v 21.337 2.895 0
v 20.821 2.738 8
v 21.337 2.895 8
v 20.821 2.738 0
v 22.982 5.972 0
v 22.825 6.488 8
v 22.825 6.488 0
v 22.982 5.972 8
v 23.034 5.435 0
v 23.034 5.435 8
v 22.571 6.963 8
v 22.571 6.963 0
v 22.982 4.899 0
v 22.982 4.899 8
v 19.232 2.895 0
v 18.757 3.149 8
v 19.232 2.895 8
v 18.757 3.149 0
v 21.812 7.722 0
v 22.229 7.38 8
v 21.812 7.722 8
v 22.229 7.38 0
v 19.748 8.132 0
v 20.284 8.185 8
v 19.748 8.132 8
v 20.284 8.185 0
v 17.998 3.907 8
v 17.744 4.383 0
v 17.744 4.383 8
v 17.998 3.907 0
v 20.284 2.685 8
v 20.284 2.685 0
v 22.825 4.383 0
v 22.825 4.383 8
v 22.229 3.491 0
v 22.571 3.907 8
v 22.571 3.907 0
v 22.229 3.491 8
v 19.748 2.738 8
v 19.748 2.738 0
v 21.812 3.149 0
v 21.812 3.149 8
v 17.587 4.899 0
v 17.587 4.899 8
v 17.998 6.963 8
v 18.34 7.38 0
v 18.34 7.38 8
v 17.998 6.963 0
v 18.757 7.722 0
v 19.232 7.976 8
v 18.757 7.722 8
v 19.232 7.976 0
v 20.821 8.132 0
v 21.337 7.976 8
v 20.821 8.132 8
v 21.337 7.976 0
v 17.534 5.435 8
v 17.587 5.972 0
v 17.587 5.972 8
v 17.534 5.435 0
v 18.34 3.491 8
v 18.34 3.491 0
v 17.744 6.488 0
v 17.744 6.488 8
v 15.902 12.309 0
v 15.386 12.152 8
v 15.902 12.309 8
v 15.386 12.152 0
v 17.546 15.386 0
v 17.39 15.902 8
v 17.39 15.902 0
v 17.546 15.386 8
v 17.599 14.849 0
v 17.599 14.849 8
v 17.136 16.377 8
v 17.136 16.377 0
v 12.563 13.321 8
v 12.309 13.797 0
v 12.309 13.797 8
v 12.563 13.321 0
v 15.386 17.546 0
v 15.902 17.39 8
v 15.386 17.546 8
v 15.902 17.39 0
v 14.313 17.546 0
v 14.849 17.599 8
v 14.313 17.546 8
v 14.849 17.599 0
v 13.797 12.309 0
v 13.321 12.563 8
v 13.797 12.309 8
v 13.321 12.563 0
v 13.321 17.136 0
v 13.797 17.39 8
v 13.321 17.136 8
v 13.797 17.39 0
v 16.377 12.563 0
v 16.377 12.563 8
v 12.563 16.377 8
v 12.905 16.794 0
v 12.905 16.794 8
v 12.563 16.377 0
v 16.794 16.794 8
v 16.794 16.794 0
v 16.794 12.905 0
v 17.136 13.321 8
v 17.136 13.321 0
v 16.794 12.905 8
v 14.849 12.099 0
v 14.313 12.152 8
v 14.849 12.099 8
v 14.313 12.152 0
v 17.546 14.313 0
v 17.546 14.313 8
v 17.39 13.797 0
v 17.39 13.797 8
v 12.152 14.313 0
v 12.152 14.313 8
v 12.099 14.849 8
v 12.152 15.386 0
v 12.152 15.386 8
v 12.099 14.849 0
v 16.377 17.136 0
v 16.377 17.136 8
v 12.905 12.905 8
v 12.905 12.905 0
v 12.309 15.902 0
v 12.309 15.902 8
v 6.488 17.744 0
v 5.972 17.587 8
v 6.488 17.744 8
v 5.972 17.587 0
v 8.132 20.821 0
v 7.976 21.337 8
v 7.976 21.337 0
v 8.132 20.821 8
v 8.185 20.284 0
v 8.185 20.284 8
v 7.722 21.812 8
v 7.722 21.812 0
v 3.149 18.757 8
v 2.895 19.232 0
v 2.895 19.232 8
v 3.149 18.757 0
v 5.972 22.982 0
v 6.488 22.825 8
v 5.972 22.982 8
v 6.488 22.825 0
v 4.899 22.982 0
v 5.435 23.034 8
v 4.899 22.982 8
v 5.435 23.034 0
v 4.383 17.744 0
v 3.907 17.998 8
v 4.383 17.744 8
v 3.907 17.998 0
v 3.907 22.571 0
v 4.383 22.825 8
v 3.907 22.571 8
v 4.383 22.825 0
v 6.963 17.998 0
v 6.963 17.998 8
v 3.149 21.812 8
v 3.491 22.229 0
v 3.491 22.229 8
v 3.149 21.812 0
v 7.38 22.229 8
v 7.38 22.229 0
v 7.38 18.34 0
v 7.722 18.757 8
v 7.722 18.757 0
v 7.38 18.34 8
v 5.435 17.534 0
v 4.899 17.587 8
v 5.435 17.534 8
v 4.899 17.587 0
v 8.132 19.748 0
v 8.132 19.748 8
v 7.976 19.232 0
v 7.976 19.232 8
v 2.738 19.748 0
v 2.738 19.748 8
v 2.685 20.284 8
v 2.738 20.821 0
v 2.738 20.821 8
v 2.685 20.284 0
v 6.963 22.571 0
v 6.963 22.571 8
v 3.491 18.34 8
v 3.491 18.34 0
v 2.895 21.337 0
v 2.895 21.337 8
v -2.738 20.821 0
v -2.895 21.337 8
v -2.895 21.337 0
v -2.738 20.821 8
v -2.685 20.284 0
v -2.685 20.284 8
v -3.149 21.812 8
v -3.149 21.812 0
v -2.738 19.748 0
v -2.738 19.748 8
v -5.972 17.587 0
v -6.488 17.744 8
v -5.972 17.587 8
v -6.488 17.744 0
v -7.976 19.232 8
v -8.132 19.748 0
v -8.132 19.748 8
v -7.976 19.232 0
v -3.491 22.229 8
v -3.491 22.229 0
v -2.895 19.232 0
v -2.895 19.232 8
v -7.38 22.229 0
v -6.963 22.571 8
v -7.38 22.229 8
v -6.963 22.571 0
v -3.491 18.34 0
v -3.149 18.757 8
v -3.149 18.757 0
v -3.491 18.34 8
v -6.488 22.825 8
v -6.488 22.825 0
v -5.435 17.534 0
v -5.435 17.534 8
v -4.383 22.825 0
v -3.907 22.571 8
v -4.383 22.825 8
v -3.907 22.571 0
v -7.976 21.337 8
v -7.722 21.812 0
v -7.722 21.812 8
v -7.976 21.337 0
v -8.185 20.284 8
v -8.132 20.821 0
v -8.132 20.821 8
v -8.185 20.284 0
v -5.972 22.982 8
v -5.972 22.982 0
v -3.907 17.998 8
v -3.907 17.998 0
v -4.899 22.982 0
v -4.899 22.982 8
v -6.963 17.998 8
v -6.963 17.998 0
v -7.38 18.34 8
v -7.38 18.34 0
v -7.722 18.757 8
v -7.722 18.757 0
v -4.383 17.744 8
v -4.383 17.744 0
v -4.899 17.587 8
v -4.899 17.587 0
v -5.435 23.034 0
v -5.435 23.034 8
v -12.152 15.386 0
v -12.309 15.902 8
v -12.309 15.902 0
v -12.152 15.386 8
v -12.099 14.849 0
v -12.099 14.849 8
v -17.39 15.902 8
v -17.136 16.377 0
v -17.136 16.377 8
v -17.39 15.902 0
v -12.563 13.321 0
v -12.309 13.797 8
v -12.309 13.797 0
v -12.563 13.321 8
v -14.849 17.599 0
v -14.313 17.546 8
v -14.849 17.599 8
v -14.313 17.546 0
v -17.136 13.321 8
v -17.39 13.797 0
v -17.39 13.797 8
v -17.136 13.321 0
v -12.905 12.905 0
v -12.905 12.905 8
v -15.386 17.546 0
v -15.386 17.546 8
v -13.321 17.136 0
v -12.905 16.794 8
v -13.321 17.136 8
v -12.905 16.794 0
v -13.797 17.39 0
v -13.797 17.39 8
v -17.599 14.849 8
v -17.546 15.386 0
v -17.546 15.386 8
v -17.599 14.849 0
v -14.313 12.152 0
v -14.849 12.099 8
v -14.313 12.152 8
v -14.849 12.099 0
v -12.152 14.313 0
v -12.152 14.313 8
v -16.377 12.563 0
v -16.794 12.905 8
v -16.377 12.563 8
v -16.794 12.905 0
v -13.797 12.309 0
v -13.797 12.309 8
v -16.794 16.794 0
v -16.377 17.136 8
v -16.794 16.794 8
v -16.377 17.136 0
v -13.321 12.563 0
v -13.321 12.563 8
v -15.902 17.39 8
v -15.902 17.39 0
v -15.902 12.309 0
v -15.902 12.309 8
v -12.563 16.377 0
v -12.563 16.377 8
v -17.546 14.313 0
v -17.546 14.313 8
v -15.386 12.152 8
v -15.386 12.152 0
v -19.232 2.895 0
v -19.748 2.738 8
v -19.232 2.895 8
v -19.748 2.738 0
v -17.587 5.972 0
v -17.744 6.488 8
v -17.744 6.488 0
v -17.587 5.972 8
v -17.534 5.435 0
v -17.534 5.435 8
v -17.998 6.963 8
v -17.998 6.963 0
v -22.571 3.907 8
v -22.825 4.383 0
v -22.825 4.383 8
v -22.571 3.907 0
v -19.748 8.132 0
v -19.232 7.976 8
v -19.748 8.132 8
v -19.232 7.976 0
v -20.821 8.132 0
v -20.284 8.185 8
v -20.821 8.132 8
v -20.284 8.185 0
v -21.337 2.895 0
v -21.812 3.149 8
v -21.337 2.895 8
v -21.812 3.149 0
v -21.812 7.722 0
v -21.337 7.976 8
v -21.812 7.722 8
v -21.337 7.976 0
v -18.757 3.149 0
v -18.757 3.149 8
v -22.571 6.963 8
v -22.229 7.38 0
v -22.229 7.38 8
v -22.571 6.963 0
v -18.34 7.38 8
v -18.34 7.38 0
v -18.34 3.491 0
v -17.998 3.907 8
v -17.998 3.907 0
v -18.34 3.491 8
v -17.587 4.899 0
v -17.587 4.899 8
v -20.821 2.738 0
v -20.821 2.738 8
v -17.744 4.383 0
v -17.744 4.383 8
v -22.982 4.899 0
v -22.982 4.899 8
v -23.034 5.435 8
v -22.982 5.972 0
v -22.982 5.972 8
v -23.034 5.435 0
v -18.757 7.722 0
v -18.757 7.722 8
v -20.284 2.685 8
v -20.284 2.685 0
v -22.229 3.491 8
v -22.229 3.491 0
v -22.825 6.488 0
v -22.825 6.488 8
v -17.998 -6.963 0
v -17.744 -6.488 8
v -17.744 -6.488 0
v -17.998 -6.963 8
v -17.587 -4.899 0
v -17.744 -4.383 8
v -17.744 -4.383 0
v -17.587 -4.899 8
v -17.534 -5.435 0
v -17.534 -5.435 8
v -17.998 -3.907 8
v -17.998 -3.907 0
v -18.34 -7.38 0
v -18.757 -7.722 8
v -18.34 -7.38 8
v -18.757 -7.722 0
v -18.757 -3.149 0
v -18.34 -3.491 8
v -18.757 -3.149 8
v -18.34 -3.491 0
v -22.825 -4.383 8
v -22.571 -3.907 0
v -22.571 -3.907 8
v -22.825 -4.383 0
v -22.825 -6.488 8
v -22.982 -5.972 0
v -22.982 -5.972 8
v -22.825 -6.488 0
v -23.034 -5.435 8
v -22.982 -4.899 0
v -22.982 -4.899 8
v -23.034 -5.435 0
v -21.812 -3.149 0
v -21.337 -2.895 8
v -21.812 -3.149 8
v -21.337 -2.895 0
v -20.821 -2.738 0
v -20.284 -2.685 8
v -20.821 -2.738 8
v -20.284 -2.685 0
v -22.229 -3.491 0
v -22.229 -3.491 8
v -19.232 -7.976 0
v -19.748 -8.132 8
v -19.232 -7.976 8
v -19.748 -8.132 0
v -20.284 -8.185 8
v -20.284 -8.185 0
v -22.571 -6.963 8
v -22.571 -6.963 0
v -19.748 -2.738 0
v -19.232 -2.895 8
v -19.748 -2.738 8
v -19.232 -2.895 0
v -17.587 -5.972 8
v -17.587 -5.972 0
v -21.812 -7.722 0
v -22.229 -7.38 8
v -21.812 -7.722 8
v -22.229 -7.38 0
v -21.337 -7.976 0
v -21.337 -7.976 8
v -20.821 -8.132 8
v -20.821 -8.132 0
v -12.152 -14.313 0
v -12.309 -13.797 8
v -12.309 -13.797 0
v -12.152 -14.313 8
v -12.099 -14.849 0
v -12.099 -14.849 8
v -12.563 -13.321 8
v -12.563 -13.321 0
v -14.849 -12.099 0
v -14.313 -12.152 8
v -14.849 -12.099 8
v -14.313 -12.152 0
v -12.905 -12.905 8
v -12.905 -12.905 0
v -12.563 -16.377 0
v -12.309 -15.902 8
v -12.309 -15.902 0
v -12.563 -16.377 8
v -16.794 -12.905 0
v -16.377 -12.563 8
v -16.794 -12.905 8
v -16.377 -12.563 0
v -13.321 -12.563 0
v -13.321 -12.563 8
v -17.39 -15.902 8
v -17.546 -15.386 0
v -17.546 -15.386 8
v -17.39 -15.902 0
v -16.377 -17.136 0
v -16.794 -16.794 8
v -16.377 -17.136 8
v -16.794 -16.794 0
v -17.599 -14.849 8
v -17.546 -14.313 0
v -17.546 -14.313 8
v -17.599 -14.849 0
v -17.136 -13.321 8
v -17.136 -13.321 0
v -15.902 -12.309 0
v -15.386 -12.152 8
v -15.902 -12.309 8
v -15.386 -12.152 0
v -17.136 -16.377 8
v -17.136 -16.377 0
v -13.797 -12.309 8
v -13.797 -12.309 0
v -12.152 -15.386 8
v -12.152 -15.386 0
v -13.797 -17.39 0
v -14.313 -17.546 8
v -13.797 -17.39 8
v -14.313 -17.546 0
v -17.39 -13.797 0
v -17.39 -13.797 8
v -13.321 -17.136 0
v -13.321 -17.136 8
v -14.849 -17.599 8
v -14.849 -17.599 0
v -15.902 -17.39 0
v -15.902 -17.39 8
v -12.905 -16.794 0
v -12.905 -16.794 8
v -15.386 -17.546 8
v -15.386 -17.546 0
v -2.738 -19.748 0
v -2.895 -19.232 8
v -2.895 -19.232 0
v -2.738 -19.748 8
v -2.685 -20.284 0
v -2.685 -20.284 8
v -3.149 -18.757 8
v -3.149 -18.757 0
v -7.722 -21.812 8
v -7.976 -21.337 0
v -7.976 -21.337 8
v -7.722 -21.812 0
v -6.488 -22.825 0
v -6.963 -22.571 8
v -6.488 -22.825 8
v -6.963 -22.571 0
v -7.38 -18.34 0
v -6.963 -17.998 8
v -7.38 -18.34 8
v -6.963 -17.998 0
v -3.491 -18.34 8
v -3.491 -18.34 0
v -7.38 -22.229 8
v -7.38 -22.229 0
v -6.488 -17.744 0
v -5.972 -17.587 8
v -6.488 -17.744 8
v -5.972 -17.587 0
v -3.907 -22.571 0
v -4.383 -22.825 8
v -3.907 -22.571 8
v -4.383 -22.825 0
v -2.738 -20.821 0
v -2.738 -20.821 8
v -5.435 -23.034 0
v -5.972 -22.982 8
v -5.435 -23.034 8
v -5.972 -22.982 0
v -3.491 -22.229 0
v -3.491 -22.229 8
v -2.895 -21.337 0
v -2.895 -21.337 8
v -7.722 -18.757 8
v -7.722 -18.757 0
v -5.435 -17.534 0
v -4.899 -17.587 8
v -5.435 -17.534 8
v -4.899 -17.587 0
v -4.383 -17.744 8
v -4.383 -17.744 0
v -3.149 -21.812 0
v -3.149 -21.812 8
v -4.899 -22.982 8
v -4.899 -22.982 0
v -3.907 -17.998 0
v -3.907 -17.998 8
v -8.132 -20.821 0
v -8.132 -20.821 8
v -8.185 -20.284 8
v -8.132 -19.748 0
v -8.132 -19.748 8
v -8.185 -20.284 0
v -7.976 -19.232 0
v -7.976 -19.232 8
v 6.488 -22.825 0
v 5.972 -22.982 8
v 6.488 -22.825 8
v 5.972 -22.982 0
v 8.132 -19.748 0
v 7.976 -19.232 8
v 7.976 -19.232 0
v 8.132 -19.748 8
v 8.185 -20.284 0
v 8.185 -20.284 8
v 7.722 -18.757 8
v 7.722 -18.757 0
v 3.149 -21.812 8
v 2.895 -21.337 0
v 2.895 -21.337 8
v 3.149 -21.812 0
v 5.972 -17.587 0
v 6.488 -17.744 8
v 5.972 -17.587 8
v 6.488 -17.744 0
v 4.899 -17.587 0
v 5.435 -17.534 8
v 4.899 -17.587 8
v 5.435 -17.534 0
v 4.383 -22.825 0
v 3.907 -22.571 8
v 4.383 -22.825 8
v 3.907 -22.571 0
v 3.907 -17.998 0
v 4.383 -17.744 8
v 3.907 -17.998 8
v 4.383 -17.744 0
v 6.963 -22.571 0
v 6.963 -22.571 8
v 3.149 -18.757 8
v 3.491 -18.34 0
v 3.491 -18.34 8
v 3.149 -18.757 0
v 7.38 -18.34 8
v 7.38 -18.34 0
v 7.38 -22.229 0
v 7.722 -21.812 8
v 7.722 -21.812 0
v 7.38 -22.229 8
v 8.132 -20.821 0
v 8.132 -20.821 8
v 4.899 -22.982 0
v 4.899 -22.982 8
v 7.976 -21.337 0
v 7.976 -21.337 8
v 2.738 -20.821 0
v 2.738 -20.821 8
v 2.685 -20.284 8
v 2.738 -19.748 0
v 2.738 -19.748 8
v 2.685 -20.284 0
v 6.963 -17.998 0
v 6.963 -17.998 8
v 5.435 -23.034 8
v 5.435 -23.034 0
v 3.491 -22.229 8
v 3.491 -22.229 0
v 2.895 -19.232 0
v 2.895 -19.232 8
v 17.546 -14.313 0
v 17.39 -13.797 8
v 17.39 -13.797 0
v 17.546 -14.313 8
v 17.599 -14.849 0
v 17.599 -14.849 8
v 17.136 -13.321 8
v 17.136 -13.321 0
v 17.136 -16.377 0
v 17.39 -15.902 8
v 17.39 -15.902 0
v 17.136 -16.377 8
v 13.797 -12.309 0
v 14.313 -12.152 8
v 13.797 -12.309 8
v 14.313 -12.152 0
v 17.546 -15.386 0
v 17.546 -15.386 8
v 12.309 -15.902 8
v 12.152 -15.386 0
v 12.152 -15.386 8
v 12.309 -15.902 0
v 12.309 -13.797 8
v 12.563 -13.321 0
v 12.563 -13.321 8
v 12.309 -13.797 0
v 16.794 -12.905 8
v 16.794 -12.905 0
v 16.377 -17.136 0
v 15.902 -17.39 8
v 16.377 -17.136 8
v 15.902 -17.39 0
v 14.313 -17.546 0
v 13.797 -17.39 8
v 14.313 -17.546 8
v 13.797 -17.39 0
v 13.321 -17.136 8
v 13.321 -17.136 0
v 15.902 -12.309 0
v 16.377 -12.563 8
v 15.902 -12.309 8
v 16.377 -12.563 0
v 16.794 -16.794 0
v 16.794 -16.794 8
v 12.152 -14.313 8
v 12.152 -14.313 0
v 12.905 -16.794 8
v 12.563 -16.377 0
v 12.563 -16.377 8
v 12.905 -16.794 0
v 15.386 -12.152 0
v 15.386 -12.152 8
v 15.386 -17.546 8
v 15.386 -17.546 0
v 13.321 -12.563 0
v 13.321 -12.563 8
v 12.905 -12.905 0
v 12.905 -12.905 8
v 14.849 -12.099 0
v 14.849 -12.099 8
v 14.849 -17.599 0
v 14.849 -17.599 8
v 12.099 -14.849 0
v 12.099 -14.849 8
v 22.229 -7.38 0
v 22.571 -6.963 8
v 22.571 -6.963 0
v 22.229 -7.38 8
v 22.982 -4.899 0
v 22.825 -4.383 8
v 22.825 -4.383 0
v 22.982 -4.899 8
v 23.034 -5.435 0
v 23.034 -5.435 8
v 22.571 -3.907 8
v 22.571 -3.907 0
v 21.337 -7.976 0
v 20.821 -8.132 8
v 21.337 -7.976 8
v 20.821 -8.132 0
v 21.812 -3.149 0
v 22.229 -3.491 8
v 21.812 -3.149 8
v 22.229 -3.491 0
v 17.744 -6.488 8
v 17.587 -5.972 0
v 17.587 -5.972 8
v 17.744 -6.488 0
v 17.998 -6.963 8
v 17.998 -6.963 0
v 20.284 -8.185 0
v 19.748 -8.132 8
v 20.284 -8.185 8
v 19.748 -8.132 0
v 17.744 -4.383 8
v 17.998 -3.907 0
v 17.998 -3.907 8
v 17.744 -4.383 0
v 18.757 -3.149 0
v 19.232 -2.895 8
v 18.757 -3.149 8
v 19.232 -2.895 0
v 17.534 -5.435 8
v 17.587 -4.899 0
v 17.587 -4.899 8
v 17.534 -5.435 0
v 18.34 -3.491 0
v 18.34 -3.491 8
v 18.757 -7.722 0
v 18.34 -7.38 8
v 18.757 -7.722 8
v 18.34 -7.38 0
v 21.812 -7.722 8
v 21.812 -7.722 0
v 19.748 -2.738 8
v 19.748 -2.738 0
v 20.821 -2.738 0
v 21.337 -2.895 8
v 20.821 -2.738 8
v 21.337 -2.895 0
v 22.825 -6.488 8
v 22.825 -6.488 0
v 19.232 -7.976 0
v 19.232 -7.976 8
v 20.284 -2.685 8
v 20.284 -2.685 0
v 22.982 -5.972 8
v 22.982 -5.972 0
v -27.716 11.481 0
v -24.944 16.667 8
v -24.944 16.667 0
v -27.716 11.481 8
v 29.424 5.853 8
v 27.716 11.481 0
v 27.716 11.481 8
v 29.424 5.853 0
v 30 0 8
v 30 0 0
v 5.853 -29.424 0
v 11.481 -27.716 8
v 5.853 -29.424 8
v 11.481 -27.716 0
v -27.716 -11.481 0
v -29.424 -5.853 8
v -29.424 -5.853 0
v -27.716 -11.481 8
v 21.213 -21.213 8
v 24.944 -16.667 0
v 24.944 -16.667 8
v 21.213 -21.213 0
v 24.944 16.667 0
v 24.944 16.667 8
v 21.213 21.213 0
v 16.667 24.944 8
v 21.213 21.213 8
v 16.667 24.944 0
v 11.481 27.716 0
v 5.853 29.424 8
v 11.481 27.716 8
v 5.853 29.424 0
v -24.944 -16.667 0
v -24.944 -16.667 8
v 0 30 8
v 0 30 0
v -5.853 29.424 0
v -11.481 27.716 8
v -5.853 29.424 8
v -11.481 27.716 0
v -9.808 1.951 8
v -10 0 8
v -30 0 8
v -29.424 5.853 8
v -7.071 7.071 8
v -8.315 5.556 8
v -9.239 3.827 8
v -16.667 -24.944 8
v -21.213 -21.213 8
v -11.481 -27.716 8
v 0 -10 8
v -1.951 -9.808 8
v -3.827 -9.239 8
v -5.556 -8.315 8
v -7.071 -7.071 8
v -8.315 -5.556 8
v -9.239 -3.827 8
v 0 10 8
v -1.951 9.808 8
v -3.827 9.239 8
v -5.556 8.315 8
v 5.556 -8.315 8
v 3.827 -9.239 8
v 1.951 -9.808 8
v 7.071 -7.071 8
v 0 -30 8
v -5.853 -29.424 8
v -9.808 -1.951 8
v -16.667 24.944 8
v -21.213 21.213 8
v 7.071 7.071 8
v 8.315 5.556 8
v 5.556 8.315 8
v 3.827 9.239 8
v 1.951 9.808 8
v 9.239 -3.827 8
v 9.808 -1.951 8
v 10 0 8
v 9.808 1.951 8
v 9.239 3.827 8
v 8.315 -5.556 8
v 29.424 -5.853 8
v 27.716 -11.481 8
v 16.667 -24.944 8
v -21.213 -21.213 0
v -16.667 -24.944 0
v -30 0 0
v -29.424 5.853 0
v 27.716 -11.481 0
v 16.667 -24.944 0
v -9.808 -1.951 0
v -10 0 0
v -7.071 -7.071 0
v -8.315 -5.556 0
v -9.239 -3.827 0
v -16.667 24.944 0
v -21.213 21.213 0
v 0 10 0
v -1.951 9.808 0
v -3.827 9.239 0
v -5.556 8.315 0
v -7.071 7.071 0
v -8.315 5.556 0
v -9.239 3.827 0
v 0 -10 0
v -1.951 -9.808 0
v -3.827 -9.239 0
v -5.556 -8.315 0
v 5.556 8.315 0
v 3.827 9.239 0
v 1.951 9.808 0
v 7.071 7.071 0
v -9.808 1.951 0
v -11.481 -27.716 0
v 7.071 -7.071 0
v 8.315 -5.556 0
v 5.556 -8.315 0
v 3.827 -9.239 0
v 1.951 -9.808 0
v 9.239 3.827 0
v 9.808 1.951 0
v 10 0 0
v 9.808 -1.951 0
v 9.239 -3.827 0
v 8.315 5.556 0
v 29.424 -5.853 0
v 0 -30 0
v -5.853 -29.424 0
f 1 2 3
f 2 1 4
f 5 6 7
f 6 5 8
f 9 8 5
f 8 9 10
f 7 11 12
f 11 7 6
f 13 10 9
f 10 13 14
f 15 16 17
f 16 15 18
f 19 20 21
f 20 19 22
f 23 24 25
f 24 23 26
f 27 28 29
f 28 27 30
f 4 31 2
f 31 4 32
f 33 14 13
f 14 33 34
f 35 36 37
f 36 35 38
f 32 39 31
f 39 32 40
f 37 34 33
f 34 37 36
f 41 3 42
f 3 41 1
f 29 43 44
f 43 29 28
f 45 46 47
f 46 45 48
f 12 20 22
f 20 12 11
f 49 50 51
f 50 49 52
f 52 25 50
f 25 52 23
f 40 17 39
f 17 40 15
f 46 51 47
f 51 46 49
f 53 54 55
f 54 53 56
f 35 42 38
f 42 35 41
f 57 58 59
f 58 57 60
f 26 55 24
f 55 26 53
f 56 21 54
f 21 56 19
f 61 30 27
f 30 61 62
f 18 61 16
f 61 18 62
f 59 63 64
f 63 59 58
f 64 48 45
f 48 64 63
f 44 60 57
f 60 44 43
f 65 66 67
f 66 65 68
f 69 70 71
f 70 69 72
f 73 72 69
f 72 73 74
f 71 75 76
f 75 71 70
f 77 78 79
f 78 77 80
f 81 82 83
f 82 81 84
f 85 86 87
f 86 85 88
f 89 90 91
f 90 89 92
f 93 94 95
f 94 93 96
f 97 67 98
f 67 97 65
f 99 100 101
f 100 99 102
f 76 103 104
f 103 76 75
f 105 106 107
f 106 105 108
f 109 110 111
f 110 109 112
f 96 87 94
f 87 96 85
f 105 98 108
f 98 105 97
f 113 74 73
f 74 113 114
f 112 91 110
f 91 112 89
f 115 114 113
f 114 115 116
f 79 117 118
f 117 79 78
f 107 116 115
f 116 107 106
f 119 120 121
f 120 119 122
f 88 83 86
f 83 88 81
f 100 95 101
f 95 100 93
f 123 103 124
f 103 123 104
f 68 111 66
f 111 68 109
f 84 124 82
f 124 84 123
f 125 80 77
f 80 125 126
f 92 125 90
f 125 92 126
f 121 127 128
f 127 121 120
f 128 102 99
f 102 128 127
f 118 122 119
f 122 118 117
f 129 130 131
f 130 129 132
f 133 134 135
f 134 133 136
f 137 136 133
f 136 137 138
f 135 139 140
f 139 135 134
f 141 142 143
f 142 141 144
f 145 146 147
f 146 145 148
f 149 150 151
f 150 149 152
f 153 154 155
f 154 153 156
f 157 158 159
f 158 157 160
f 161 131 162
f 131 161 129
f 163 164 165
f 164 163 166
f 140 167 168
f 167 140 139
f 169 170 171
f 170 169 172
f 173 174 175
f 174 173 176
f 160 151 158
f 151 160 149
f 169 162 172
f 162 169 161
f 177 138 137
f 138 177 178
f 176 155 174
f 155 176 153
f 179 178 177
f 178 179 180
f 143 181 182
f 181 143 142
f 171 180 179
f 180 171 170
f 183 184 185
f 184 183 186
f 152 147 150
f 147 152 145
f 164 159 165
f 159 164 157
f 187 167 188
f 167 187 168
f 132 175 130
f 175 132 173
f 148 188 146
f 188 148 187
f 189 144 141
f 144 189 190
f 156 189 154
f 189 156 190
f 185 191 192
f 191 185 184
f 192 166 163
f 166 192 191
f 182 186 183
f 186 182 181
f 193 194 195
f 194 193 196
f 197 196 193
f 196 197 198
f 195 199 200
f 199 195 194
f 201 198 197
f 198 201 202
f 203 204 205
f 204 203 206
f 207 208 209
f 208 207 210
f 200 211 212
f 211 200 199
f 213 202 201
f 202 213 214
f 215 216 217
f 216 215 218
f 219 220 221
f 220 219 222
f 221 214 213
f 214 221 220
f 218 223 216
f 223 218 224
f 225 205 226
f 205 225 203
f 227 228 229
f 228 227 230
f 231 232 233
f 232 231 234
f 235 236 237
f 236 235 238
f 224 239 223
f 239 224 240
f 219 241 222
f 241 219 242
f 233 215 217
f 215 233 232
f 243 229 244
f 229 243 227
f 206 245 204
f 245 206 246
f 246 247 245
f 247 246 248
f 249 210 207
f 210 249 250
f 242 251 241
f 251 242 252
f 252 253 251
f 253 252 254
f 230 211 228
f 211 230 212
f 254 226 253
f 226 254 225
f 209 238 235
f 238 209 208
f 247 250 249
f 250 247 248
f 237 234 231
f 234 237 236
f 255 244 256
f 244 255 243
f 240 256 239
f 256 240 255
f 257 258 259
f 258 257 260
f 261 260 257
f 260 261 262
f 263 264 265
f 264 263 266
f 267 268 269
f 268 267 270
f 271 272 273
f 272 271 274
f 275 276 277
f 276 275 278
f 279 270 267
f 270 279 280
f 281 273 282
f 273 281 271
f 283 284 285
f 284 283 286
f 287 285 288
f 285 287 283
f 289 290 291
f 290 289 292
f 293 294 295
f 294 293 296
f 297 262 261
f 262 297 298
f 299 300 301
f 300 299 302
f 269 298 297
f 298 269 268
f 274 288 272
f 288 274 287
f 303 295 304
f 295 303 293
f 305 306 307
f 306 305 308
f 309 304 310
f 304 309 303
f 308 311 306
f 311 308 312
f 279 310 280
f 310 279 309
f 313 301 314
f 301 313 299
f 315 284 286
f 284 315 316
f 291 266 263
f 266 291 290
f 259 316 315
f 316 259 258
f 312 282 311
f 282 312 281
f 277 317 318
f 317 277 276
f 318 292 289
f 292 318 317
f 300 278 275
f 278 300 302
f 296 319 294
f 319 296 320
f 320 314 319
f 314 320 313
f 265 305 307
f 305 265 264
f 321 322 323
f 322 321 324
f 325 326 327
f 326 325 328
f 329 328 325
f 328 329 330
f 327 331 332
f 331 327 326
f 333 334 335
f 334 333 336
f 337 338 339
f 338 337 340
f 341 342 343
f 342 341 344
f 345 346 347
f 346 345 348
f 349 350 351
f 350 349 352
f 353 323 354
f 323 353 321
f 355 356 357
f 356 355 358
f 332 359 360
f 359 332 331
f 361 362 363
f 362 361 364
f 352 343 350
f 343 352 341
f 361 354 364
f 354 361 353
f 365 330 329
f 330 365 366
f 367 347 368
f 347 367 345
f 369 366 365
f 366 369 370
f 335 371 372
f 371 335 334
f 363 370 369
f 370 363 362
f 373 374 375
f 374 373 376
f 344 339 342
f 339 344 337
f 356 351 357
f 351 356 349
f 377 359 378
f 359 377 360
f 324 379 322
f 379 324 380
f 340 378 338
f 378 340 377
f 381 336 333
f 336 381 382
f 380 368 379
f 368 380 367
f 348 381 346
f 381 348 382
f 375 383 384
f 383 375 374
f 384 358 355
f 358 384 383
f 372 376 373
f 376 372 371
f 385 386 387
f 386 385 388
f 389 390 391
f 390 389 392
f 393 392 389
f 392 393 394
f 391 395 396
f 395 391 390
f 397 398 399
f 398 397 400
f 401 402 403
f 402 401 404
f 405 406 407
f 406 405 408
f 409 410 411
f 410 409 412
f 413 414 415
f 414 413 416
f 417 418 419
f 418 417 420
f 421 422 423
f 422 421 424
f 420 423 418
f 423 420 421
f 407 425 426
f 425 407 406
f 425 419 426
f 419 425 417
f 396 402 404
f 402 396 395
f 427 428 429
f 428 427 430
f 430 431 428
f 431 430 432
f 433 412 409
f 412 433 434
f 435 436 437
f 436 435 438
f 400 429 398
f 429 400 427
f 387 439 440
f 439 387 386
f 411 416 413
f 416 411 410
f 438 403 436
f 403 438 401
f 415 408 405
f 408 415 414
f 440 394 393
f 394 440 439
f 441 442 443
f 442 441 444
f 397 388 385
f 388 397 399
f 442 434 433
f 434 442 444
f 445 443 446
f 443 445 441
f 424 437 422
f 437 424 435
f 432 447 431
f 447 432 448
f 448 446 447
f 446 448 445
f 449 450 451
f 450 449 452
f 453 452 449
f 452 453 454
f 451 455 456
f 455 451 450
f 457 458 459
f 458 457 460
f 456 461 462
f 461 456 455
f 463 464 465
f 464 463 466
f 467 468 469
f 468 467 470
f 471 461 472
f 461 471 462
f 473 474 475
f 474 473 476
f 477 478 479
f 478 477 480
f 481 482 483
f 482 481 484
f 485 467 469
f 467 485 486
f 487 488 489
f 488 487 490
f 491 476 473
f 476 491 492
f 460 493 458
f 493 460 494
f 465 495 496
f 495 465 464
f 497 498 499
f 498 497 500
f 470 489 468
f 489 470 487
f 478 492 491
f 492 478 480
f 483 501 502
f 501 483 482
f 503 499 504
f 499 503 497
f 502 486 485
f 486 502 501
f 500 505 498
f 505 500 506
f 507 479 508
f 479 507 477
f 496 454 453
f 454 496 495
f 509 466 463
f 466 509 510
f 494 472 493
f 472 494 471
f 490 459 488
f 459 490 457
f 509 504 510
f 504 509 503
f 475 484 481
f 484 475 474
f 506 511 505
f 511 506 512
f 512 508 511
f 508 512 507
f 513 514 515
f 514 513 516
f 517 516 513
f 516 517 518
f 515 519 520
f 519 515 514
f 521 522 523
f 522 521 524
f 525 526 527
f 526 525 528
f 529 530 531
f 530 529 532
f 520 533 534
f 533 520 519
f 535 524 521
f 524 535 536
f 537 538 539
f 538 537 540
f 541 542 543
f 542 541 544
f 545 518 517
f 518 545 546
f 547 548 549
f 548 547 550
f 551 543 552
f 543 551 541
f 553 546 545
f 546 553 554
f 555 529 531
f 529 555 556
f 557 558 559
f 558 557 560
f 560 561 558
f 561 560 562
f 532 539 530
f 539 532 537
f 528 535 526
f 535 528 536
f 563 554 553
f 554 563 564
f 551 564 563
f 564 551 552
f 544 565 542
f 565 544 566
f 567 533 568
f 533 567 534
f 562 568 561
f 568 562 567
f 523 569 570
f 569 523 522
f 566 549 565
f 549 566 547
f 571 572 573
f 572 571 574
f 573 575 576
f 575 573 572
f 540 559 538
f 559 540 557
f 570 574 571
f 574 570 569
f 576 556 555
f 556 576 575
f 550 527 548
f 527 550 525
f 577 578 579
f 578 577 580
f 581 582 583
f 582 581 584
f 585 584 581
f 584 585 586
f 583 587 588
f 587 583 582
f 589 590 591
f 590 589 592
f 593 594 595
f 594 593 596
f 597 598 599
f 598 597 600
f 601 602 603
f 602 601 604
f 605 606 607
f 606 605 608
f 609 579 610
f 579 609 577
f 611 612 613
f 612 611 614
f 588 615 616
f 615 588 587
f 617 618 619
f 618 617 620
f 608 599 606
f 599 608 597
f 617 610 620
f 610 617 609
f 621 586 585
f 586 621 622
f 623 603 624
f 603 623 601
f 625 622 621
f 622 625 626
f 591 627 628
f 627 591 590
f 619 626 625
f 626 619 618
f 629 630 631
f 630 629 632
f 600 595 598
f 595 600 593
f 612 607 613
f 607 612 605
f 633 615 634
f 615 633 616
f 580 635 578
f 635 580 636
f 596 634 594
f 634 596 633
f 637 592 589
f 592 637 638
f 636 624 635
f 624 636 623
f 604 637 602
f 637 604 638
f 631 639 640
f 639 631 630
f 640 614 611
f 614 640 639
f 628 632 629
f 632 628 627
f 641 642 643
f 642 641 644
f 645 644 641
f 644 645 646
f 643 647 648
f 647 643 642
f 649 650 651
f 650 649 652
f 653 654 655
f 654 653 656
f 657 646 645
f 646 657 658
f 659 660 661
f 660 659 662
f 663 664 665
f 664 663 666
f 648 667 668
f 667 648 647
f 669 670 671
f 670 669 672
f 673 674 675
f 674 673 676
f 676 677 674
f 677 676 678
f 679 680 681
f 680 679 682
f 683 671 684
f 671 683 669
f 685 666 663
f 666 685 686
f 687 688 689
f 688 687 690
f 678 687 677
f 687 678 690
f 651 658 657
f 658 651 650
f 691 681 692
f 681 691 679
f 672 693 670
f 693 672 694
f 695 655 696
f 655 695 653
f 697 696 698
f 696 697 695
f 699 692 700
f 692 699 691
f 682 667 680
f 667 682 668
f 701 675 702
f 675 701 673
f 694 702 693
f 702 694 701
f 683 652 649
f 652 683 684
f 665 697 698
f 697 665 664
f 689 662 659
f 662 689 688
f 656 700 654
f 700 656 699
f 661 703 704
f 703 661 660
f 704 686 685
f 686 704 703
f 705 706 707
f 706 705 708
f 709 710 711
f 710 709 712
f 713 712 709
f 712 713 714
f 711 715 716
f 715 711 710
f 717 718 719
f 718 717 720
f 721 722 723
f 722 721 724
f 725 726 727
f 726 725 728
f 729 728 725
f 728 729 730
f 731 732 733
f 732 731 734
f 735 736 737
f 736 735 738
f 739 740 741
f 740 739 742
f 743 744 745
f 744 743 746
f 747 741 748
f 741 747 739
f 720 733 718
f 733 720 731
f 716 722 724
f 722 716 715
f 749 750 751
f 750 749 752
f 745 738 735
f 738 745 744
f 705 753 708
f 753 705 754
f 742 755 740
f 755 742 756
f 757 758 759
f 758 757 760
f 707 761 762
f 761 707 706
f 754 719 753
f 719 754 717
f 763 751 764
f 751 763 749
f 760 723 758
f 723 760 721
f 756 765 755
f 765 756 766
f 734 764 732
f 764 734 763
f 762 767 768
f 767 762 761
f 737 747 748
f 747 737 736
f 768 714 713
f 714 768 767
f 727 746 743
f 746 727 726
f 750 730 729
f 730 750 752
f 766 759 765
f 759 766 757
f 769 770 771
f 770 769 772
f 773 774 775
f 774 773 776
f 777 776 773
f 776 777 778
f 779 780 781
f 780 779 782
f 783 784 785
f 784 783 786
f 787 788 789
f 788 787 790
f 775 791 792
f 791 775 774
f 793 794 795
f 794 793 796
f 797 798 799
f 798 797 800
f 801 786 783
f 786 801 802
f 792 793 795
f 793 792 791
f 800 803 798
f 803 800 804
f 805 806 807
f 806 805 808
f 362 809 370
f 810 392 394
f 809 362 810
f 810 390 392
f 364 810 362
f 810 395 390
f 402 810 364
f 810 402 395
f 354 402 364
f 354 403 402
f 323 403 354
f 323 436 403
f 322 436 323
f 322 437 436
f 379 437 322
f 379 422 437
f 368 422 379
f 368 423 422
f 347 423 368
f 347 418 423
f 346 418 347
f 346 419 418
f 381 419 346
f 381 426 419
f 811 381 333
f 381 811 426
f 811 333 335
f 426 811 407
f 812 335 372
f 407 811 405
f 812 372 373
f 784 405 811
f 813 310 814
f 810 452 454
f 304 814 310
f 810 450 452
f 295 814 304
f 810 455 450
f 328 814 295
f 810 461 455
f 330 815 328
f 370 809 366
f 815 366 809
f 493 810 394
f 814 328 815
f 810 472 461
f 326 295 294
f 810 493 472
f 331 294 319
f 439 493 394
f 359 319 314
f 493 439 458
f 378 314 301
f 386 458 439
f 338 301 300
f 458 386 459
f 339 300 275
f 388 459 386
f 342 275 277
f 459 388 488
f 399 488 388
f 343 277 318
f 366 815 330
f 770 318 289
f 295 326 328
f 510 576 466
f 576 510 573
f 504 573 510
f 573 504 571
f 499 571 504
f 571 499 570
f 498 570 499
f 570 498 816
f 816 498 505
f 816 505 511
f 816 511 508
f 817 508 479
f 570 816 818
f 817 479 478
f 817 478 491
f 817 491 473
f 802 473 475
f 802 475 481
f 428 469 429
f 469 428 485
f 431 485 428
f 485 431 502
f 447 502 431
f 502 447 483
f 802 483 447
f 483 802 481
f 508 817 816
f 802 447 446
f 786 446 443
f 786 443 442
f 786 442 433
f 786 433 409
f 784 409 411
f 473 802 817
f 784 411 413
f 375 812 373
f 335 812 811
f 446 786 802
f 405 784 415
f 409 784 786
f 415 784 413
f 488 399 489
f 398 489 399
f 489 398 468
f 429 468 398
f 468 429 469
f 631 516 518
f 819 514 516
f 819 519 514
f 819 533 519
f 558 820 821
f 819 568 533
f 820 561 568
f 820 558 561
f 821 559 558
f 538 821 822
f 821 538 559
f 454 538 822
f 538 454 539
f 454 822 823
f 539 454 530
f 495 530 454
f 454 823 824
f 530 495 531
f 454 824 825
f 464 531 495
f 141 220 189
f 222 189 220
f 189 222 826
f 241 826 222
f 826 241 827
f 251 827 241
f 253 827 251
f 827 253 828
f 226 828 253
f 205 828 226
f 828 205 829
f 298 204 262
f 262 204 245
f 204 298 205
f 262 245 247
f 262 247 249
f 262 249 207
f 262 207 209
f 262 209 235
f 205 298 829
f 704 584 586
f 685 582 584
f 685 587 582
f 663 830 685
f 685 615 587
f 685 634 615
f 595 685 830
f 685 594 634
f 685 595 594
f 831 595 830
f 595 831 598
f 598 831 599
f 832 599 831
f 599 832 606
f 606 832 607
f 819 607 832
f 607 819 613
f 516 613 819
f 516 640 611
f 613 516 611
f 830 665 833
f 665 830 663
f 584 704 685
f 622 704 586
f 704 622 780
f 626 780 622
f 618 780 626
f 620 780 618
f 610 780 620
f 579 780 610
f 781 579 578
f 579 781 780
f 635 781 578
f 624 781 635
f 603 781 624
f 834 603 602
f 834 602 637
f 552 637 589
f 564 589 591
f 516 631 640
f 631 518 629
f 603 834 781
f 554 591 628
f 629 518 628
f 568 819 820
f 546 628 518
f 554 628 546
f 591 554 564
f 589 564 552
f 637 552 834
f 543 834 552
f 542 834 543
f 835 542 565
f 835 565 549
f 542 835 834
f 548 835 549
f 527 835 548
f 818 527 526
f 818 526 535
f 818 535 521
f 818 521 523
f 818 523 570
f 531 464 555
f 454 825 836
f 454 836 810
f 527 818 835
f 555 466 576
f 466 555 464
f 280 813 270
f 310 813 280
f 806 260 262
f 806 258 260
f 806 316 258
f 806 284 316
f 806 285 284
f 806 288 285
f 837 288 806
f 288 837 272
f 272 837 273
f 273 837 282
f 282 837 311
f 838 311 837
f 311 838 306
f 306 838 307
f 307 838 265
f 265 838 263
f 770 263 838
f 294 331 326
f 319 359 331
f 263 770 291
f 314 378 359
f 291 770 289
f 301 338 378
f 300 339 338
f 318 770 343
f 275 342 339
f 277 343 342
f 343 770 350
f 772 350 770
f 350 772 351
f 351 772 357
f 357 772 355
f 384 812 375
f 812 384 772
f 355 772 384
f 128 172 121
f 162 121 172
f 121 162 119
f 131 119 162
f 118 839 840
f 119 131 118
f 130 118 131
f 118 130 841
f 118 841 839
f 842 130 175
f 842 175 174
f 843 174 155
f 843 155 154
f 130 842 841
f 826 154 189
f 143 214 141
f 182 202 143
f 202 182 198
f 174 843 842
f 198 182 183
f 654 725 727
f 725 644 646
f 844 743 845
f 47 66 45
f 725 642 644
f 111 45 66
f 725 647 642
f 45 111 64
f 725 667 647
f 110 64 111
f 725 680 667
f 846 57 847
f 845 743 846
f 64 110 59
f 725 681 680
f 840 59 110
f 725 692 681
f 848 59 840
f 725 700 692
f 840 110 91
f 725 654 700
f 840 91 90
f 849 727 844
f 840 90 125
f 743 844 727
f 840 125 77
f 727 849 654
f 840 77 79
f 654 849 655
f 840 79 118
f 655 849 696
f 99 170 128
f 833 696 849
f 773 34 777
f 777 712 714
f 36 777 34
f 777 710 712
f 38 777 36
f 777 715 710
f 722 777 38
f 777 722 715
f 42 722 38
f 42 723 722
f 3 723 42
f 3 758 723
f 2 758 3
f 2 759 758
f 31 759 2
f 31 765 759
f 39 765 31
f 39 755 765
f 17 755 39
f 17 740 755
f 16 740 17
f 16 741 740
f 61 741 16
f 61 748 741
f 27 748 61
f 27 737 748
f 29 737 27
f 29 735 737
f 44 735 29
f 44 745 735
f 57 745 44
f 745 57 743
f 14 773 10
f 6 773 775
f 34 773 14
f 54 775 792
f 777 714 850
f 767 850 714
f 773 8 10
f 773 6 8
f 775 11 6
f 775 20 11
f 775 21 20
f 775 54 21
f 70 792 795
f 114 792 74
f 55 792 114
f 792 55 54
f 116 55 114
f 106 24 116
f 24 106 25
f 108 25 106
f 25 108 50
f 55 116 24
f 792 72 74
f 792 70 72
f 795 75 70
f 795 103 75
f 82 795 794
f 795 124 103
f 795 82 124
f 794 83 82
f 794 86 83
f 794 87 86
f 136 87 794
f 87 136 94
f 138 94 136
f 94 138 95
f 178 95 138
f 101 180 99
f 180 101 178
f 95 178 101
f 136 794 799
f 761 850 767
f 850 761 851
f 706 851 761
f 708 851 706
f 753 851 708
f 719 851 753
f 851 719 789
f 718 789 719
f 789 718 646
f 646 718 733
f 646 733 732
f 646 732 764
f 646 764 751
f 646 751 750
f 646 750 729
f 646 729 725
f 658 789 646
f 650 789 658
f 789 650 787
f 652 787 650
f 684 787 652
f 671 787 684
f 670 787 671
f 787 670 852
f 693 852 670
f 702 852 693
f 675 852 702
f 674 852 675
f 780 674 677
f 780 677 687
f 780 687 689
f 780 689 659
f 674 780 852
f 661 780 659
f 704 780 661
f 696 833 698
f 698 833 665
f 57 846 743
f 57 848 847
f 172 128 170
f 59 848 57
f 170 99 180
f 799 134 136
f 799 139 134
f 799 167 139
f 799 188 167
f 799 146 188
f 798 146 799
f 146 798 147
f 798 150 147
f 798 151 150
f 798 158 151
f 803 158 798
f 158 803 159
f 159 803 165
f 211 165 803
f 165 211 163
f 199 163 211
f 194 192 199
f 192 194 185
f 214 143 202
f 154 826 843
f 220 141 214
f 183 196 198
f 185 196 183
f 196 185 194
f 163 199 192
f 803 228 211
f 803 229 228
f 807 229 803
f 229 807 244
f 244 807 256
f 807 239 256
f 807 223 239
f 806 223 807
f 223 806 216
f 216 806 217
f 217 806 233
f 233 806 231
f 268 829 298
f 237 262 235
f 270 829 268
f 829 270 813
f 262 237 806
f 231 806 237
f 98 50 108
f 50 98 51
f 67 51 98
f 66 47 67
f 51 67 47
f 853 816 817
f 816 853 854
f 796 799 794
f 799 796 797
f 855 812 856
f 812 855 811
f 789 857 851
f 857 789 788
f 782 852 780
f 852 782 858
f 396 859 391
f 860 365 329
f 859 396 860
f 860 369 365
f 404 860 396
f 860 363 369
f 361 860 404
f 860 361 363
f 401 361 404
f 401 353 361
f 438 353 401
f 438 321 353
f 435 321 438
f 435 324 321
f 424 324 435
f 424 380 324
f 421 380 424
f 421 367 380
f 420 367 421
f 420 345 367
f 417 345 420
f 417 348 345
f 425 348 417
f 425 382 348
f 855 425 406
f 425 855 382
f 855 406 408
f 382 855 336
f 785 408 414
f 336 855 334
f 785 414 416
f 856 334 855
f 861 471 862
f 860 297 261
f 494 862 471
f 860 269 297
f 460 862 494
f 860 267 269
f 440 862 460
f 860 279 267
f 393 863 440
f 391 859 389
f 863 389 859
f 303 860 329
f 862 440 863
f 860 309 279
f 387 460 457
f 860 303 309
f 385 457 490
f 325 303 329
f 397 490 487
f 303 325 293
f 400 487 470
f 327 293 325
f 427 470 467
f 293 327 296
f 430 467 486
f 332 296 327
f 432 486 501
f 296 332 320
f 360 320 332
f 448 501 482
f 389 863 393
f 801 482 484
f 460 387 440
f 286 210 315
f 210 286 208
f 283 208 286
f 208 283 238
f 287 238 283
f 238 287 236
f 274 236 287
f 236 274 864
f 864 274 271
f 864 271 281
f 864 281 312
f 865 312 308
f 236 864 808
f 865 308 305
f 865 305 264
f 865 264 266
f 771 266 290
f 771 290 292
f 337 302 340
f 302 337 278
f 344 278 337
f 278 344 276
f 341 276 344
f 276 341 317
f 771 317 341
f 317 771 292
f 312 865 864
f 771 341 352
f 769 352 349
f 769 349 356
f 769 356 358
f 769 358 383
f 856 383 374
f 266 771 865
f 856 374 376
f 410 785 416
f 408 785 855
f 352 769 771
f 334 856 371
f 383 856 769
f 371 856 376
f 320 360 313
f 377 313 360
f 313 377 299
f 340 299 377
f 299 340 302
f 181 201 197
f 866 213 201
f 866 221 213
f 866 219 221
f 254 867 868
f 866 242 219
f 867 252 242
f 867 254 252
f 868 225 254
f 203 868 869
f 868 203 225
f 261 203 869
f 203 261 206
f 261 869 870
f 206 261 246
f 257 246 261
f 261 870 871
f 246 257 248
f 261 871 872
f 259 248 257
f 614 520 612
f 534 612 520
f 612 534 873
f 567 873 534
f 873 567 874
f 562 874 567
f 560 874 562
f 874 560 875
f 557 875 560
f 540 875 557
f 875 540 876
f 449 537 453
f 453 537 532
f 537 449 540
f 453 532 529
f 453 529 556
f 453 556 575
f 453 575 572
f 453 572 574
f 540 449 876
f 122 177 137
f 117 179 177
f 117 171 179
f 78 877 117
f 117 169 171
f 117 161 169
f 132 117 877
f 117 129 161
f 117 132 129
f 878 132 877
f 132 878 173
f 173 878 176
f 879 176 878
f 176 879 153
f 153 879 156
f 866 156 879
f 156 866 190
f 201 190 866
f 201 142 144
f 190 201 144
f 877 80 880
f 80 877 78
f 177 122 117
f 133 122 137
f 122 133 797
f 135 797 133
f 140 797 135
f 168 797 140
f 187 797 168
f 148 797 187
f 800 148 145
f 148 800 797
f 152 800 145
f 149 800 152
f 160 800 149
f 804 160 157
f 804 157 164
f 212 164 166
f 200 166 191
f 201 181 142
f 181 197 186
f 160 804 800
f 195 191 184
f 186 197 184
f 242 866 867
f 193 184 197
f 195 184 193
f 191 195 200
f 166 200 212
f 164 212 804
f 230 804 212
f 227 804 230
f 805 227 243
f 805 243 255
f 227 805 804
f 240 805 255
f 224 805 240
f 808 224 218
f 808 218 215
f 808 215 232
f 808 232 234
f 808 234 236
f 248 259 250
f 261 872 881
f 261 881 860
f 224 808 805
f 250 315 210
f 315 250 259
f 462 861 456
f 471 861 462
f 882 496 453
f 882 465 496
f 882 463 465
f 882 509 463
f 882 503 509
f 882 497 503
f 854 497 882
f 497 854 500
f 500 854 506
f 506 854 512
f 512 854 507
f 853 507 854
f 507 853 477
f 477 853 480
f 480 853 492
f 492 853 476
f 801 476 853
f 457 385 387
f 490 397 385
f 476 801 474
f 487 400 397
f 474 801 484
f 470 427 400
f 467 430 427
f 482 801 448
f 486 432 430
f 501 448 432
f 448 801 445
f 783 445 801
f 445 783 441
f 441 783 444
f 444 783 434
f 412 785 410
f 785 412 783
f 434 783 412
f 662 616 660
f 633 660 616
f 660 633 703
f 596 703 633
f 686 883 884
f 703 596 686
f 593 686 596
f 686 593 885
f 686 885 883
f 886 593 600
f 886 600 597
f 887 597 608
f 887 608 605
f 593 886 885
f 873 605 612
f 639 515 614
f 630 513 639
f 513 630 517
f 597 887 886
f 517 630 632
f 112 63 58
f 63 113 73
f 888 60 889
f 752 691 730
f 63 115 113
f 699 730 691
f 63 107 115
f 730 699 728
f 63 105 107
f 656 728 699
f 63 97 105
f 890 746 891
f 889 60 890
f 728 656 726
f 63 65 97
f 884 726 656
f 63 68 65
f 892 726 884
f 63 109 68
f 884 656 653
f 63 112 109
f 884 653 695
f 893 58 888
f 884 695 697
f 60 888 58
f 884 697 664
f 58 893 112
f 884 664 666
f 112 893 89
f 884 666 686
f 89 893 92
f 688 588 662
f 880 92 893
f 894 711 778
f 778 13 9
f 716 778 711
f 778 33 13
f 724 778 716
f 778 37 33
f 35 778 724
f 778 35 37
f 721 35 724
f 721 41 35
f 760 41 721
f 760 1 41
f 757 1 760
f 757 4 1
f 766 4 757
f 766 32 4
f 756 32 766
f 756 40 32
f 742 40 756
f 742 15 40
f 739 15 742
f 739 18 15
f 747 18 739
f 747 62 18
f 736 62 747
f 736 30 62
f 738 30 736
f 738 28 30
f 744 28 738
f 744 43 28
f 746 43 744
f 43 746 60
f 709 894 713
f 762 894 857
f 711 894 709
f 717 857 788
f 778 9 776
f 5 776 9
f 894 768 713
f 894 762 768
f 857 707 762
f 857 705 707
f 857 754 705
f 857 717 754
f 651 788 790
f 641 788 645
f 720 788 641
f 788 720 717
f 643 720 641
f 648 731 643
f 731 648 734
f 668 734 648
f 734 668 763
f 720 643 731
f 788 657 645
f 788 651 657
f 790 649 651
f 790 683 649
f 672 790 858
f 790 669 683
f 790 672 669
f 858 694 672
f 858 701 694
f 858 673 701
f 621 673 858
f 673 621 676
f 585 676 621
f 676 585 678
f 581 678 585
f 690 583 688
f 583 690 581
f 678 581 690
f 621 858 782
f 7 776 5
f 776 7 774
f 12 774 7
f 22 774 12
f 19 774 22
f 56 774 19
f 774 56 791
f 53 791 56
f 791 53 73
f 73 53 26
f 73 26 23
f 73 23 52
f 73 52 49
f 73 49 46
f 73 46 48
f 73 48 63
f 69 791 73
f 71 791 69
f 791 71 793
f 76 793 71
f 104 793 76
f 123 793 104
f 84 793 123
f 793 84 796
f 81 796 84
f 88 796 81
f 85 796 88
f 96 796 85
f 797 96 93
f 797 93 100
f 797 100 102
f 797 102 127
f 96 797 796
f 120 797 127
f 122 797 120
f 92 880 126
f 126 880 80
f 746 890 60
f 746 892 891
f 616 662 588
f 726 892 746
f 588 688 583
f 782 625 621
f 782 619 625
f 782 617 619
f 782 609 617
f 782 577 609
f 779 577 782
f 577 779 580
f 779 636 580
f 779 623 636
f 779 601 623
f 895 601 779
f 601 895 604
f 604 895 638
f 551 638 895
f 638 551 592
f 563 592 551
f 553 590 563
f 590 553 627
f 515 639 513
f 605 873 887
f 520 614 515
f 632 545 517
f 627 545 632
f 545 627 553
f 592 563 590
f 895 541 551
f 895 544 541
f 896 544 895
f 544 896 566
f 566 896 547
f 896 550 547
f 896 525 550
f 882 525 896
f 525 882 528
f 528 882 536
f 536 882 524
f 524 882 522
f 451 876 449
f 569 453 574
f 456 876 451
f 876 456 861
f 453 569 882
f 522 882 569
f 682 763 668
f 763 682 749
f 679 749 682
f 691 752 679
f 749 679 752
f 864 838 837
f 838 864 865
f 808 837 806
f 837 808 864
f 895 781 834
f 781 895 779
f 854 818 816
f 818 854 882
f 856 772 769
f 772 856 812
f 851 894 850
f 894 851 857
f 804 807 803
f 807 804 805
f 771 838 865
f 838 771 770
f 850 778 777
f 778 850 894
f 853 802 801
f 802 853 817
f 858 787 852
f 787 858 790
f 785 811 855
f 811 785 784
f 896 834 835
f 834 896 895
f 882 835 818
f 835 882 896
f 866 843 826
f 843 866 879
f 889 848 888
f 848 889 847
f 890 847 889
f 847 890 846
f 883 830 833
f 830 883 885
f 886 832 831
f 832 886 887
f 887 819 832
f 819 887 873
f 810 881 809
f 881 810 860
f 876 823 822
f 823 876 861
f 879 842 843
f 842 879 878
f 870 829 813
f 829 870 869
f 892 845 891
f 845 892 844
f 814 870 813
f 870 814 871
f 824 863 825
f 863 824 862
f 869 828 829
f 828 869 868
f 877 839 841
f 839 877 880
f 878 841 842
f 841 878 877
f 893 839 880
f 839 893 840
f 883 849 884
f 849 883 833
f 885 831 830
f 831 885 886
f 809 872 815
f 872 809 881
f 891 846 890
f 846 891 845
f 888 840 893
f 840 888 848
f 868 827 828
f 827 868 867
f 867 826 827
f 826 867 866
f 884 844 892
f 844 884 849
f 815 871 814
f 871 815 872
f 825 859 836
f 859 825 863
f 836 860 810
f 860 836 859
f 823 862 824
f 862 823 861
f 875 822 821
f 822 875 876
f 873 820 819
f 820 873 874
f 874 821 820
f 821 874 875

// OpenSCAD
$fn = 32;

// ----------------------------------------------------------------------
// Flange Ø60 x 8
// 12 holes on a Ø42 bolt circle, bolted joints
// ----------------------------------------------------------------------

// --- parameters (mm) ---
flange_d = 60;   // outside diameter of the flange
thickness = 8;   // flange thickness
holes = 12;      // number of bolt holes
pcd = 42;        // bolt circle diameter
start_deg = 15;  // angle of the first hole, from +X
hole_d = 5.5;    // bolt hole diameter
bore_d = 20;     // central through bore
hub_d = 32;      // hub outside diameter
hub_h = 0;       // hub height above the flange face (0 = no hub)

// --- derived feature positions (mm) ---
height = thickness + hub_h;  // = 8   overall height of the part
pcd_r = pcd / 2;             // = 21   bolt circle radius
hole_step = 360 / holes;     // = 30   angular pitch
feature_centers = [
  [pcd_r * cos(start_deg + 0 * hole_step), pcd_r * sin(start_deg + 0 * hole_step)],
  [pcd_r * cos(start_deg + 1 * hole_step), pcd_r * sin(start_deg + 1 * hole_step)],
  [pcd_r * cos(start_deg + 2 * hole_step), pcd_r * sin(start_deg + 2 * hole_step)],
  [pcd_r * cos(start_deg + 3 * hole_step), pcd_r * sin(start_deg + 3 * hole_step)],
  [pcd_r * cos(start_deg + 4 * hole_step), pcd_r * sin(start_deg + 4 * hole_step)],
  [pcd_r * cos(start_deg + 5 * hole_step), pcd_r * sin(start_deg + 5 * hole_step)],
  [pcd_r * cos(start_deg + 6 * hole_step), pcd_r * sin(start_deg + 6 * hole_step)],
  [pcd_r * cos(start_deg + 7 * hole_step), pcd_r * sin(start_deg + 7 * hole_step)],
  [pcd_r * cos(start_deg + 8 * hole_step), pcd_r * sin(start_deg + 8 * hole_step)],
  [pcd_r * cos(start_deg + 9 * hole_step), pcd_r * sin(start_deg + 9 * hole_step)],
  [pcd_r * cos(start_deg + 10 * hole_step), pcd_r * sin(start_deg + 10 * hole_step)],
  [pcd_r * cos(start_deg + 11 * hole_step), pcd_r * sin(start_deg + 11 * hole_step)]
];   // bolt hole centres on the pitch circle

// flange disc, every hole and the bore cut straight through
difference() {
  union() {
    cylinder(d = flange_d, h = thickness);
  }
  translate([0, 0, -1]) cylinder(d = bore_d, h = height + 2);  // bore, through
  for (centre = feature_centers)
    translate([centre[0], centre[1], -1]) cylinder(d = hole_d, h = thickness + 2);
}
